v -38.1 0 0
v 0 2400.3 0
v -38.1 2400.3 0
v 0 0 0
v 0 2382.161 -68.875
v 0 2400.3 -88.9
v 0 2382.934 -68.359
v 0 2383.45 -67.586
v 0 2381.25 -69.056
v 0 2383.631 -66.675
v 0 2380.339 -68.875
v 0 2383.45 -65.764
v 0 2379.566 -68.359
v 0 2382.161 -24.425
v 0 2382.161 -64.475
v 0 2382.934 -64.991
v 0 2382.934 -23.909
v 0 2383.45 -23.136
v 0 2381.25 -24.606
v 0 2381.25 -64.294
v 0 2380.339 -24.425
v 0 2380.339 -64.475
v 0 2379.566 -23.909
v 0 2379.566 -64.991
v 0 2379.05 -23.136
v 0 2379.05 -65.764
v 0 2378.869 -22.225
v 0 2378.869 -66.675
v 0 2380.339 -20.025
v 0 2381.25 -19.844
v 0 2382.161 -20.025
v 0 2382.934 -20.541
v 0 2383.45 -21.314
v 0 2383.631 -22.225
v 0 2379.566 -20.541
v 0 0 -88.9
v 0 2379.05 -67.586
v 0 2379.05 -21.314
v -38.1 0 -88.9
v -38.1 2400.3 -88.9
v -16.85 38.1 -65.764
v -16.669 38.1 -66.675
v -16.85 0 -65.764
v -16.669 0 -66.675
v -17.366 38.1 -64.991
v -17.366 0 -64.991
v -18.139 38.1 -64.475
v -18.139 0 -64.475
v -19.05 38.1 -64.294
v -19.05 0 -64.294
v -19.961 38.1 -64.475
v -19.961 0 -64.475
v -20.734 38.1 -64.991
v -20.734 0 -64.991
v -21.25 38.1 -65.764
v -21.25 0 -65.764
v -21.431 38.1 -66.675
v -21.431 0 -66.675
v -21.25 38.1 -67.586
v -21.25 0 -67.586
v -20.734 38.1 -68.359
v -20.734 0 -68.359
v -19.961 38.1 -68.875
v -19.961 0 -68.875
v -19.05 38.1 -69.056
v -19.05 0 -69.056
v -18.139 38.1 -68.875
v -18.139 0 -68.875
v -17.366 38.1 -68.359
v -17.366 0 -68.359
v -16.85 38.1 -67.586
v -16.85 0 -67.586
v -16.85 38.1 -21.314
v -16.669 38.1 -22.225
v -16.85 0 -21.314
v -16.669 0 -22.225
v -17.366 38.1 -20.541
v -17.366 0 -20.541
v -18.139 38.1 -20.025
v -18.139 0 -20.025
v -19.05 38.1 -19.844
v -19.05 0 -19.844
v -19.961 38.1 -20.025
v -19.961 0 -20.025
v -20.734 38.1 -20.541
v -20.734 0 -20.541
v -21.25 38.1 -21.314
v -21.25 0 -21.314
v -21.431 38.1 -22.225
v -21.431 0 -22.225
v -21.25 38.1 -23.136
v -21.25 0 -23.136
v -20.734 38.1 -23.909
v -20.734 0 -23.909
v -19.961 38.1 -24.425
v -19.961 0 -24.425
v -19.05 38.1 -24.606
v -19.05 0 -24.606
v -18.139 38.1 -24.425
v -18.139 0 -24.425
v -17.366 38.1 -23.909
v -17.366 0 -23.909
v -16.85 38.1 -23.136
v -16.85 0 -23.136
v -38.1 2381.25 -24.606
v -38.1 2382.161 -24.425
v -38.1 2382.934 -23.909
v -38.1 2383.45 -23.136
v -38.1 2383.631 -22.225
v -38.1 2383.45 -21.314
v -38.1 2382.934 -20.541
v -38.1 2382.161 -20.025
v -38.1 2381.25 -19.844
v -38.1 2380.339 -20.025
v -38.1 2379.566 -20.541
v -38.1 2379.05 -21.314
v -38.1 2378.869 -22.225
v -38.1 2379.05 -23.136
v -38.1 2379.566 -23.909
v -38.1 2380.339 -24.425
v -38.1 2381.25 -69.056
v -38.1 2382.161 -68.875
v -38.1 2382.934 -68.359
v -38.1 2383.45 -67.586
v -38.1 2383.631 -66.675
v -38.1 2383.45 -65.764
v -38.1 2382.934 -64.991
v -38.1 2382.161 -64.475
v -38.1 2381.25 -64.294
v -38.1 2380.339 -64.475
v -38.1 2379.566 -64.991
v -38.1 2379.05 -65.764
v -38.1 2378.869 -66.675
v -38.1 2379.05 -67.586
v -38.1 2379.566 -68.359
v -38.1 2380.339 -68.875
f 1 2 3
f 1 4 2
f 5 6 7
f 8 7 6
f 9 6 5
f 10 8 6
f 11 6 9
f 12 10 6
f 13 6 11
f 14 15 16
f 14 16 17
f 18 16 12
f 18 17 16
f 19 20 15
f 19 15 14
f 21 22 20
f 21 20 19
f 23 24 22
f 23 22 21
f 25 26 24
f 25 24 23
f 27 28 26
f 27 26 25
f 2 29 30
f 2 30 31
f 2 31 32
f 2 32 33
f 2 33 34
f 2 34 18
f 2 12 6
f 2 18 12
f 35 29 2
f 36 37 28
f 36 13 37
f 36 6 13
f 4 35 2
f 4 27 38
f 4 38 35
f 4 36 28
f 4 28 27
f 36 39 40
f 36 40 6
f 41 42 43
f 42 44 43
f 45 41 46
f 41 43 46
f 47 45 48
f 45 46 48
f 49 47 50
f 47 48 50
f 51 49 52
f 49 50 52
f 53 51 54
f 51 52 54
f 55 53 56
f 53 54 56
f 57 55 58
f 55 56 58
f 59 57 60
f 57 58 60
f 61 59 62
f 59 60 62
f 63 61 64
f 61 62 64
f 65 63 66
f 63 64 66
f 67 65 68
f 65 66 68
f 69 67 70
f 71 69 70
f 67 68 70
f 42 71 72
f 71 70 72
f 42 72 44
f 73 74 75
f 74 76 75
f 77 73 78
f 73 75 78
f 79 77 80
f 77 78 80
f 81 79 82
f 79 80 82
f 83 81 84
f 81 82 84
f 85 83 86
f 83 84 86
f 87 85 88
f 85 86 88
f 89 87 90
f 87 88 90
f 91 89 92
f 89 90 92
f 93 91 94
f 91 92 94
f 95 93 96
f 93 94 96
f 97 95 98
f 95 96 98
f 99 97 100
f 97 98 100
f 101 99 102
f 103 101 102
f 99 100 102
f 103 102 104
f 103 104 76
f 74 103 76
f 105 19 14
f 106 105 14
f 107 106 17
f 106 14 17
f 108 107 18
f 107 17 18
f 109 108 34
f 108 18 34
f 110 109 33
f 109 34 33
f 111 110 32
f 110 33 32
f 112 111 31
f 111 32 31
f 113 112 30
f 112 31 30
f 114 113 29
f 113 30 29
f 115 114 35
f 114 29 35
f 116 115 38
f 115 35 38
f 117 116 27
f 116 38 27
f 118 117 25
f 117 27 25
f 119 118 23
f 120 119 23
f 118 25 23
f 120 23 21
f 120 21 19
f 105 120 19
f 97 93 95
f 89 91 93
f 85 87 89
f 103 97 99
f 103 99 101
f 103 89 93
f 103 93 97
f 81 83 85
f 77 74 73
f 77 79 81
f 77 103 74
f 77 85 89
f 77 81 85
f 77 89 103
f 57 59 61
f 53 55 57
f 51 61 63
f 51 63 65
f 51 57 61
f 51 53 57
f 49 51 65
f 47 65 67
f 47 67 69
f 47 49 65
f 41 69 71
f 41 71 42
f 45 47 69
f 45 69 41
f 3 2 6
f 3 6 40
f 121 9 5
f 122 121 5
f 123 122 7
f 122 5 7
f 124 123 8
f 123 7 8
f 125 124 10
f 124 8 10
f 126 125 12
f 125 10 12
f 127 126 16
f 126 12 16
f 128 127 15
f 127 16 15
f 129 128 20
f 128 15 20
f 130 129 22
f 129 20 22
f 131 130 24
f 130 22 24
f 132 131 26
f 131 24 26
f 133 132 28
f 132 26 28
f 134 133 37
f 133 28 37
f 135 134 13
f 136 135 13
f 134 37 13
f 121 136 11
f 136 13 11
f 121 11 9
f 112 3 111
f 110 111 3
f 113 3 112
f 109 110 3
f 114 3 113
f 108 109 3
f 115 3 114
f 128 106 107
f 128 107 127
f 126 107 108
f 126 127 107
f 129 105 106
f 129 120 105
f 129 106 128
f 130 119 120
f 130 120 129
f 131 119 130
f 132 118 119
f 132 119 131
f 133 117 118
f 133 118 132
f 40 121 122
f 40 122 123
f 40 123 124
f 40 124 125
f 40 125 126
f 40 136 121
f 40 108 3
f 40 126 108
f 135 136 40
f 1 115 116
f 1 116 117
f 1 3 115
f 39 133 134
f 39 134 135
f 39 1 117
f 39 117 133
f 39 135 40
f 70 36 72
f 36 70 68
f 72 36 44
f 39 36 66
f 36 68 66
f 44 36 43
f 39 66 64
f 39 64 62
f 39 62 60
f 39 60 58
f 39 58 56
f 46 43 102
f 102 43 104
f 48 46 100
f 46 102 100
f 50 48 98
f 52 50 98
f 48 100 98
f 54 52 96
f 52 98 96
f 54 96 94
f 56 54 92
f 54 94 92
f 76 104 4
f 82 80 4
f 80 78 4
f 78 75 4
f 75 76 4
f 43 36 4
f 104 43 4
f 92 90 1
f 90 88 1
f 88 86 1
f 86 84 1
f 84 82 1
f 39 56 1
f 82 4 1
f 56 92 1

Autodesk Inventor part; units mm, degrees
ref_plane "YZ Plane" through (0, 0, 0) normal (1, 0, 0) x (0, 1, 0)
ref_plane "XZ Plane" through (0, 0, 0) normal (0, 1, 0) x (-1, 0, 0)
ref_plane "XY Plane" through (0, 0, 0) normal (0, 0, 1) x (1, 0, 0)
sketch "Sketch1" plane through (0, 0, 0) normal (0, 1, 0) x (-1, 0, 0)
  line L0 (0, 0) -> (38.1, 0)
  line L1 (38.1, 0) -> (38.1, -88.9)
  line L2 (38.1, -88.9) -> (0, -88.9)
  line L3 (0, -88.9) -> (0, 0)
  dimension "d0" = 38.1
  dimension "d1" = 88.9
extrude "Extrusion1" add sketch "Sketch1" along normal blind 2400.3
sketch "Sketch4" plane through (0, 0, 0) normal (0, -1, 0) x (1, 0, 0)
  line L0 (-38.1, -88.9) -> (-38.1, 0) projected
  line L1 (0, 0) -> (-38.1, 0)
  line L2 (-38.1, 0) -> (-38.1, -44.45)
  line L3 (-38.1, -44.45) -> (0, -44.45)
  line L4 (0, -44.45) -> (0, 0)
  line L5 (0, 0) -> (0, -88.9) projected
  line L6 (-19.05, -44.45) -> (0, -44.45)
  line L7 (0, -44.45) -> (0, -22.225)
  line L8 (0, -22.225) -> (-19.05, -22.225)
  line L9 (-19.05, -22.225) -> (-19.05, -44.45)
  circle A0 centre (-19.05, -22.225) radius 2.3812
  circle A1 centre (-19.05, -66.675) radius 2.3812
  dimension "d12" = 4.7625
extrude "Extrusion4" cut sketch "Sketch4" against normal blind 38.1 contours A0 L8 L9 | L9 L8 A0 | A1
sketch "Sketch5" plane through (0, 0, 0) normal (1, 0, 0) x (0, 0, -1)
  line L0 (88.9, 0) -> (88.9, 2400.3) projected
  line L1 (0, 0) -> (0, 2400.3) projected
  line L2 (88.9, 2400.3) -> (0, 2400.3)
  line L3 (0, 2400.3) -> (0, 2362.2)
  line L4 (0, 2362.2) -> (88.9, 2362.2)
  line L5 (88.9, 2362.2) -> (88.9, 2400.3)
  line L6 (0, 2362.2) -> (44.45, 2362.2)
  line L7 (44.45, 2362.2) -> (44.45, 2381.25)
  line L8 (44.45, 2381.25) -> (0, 2381.25)
  line L9 (0, 2381.25) -> (0, 2362.2)
  line L10 (44.45, 2381.25) -> (22.225, 2381.25)
  line L11 (22.225, 2381.25) -> (22.225, 2362.2)
  line L12 (22.225, 2362.2) -> (44.45, 2362.2)
  line L13 (44.45, 2362.2) -> (44.45, 2381.25)
  circle A0 centre (22.225, 2381.25) radius 2.3812
  circle A1 centre (66.675, 2381.25) radius 2.3812
  dimension "d15" = 38.1
  dimension "d16" = 4.7625
extrude "Extrusion5" cut sketch "Sketch5" against normal up to surface (38.1 mm away) contours A0 L8 L11 | L11 L8 A0 | L8 A0 | A1
properties part number "wallLeftLong" material "Wood (Birch)"
